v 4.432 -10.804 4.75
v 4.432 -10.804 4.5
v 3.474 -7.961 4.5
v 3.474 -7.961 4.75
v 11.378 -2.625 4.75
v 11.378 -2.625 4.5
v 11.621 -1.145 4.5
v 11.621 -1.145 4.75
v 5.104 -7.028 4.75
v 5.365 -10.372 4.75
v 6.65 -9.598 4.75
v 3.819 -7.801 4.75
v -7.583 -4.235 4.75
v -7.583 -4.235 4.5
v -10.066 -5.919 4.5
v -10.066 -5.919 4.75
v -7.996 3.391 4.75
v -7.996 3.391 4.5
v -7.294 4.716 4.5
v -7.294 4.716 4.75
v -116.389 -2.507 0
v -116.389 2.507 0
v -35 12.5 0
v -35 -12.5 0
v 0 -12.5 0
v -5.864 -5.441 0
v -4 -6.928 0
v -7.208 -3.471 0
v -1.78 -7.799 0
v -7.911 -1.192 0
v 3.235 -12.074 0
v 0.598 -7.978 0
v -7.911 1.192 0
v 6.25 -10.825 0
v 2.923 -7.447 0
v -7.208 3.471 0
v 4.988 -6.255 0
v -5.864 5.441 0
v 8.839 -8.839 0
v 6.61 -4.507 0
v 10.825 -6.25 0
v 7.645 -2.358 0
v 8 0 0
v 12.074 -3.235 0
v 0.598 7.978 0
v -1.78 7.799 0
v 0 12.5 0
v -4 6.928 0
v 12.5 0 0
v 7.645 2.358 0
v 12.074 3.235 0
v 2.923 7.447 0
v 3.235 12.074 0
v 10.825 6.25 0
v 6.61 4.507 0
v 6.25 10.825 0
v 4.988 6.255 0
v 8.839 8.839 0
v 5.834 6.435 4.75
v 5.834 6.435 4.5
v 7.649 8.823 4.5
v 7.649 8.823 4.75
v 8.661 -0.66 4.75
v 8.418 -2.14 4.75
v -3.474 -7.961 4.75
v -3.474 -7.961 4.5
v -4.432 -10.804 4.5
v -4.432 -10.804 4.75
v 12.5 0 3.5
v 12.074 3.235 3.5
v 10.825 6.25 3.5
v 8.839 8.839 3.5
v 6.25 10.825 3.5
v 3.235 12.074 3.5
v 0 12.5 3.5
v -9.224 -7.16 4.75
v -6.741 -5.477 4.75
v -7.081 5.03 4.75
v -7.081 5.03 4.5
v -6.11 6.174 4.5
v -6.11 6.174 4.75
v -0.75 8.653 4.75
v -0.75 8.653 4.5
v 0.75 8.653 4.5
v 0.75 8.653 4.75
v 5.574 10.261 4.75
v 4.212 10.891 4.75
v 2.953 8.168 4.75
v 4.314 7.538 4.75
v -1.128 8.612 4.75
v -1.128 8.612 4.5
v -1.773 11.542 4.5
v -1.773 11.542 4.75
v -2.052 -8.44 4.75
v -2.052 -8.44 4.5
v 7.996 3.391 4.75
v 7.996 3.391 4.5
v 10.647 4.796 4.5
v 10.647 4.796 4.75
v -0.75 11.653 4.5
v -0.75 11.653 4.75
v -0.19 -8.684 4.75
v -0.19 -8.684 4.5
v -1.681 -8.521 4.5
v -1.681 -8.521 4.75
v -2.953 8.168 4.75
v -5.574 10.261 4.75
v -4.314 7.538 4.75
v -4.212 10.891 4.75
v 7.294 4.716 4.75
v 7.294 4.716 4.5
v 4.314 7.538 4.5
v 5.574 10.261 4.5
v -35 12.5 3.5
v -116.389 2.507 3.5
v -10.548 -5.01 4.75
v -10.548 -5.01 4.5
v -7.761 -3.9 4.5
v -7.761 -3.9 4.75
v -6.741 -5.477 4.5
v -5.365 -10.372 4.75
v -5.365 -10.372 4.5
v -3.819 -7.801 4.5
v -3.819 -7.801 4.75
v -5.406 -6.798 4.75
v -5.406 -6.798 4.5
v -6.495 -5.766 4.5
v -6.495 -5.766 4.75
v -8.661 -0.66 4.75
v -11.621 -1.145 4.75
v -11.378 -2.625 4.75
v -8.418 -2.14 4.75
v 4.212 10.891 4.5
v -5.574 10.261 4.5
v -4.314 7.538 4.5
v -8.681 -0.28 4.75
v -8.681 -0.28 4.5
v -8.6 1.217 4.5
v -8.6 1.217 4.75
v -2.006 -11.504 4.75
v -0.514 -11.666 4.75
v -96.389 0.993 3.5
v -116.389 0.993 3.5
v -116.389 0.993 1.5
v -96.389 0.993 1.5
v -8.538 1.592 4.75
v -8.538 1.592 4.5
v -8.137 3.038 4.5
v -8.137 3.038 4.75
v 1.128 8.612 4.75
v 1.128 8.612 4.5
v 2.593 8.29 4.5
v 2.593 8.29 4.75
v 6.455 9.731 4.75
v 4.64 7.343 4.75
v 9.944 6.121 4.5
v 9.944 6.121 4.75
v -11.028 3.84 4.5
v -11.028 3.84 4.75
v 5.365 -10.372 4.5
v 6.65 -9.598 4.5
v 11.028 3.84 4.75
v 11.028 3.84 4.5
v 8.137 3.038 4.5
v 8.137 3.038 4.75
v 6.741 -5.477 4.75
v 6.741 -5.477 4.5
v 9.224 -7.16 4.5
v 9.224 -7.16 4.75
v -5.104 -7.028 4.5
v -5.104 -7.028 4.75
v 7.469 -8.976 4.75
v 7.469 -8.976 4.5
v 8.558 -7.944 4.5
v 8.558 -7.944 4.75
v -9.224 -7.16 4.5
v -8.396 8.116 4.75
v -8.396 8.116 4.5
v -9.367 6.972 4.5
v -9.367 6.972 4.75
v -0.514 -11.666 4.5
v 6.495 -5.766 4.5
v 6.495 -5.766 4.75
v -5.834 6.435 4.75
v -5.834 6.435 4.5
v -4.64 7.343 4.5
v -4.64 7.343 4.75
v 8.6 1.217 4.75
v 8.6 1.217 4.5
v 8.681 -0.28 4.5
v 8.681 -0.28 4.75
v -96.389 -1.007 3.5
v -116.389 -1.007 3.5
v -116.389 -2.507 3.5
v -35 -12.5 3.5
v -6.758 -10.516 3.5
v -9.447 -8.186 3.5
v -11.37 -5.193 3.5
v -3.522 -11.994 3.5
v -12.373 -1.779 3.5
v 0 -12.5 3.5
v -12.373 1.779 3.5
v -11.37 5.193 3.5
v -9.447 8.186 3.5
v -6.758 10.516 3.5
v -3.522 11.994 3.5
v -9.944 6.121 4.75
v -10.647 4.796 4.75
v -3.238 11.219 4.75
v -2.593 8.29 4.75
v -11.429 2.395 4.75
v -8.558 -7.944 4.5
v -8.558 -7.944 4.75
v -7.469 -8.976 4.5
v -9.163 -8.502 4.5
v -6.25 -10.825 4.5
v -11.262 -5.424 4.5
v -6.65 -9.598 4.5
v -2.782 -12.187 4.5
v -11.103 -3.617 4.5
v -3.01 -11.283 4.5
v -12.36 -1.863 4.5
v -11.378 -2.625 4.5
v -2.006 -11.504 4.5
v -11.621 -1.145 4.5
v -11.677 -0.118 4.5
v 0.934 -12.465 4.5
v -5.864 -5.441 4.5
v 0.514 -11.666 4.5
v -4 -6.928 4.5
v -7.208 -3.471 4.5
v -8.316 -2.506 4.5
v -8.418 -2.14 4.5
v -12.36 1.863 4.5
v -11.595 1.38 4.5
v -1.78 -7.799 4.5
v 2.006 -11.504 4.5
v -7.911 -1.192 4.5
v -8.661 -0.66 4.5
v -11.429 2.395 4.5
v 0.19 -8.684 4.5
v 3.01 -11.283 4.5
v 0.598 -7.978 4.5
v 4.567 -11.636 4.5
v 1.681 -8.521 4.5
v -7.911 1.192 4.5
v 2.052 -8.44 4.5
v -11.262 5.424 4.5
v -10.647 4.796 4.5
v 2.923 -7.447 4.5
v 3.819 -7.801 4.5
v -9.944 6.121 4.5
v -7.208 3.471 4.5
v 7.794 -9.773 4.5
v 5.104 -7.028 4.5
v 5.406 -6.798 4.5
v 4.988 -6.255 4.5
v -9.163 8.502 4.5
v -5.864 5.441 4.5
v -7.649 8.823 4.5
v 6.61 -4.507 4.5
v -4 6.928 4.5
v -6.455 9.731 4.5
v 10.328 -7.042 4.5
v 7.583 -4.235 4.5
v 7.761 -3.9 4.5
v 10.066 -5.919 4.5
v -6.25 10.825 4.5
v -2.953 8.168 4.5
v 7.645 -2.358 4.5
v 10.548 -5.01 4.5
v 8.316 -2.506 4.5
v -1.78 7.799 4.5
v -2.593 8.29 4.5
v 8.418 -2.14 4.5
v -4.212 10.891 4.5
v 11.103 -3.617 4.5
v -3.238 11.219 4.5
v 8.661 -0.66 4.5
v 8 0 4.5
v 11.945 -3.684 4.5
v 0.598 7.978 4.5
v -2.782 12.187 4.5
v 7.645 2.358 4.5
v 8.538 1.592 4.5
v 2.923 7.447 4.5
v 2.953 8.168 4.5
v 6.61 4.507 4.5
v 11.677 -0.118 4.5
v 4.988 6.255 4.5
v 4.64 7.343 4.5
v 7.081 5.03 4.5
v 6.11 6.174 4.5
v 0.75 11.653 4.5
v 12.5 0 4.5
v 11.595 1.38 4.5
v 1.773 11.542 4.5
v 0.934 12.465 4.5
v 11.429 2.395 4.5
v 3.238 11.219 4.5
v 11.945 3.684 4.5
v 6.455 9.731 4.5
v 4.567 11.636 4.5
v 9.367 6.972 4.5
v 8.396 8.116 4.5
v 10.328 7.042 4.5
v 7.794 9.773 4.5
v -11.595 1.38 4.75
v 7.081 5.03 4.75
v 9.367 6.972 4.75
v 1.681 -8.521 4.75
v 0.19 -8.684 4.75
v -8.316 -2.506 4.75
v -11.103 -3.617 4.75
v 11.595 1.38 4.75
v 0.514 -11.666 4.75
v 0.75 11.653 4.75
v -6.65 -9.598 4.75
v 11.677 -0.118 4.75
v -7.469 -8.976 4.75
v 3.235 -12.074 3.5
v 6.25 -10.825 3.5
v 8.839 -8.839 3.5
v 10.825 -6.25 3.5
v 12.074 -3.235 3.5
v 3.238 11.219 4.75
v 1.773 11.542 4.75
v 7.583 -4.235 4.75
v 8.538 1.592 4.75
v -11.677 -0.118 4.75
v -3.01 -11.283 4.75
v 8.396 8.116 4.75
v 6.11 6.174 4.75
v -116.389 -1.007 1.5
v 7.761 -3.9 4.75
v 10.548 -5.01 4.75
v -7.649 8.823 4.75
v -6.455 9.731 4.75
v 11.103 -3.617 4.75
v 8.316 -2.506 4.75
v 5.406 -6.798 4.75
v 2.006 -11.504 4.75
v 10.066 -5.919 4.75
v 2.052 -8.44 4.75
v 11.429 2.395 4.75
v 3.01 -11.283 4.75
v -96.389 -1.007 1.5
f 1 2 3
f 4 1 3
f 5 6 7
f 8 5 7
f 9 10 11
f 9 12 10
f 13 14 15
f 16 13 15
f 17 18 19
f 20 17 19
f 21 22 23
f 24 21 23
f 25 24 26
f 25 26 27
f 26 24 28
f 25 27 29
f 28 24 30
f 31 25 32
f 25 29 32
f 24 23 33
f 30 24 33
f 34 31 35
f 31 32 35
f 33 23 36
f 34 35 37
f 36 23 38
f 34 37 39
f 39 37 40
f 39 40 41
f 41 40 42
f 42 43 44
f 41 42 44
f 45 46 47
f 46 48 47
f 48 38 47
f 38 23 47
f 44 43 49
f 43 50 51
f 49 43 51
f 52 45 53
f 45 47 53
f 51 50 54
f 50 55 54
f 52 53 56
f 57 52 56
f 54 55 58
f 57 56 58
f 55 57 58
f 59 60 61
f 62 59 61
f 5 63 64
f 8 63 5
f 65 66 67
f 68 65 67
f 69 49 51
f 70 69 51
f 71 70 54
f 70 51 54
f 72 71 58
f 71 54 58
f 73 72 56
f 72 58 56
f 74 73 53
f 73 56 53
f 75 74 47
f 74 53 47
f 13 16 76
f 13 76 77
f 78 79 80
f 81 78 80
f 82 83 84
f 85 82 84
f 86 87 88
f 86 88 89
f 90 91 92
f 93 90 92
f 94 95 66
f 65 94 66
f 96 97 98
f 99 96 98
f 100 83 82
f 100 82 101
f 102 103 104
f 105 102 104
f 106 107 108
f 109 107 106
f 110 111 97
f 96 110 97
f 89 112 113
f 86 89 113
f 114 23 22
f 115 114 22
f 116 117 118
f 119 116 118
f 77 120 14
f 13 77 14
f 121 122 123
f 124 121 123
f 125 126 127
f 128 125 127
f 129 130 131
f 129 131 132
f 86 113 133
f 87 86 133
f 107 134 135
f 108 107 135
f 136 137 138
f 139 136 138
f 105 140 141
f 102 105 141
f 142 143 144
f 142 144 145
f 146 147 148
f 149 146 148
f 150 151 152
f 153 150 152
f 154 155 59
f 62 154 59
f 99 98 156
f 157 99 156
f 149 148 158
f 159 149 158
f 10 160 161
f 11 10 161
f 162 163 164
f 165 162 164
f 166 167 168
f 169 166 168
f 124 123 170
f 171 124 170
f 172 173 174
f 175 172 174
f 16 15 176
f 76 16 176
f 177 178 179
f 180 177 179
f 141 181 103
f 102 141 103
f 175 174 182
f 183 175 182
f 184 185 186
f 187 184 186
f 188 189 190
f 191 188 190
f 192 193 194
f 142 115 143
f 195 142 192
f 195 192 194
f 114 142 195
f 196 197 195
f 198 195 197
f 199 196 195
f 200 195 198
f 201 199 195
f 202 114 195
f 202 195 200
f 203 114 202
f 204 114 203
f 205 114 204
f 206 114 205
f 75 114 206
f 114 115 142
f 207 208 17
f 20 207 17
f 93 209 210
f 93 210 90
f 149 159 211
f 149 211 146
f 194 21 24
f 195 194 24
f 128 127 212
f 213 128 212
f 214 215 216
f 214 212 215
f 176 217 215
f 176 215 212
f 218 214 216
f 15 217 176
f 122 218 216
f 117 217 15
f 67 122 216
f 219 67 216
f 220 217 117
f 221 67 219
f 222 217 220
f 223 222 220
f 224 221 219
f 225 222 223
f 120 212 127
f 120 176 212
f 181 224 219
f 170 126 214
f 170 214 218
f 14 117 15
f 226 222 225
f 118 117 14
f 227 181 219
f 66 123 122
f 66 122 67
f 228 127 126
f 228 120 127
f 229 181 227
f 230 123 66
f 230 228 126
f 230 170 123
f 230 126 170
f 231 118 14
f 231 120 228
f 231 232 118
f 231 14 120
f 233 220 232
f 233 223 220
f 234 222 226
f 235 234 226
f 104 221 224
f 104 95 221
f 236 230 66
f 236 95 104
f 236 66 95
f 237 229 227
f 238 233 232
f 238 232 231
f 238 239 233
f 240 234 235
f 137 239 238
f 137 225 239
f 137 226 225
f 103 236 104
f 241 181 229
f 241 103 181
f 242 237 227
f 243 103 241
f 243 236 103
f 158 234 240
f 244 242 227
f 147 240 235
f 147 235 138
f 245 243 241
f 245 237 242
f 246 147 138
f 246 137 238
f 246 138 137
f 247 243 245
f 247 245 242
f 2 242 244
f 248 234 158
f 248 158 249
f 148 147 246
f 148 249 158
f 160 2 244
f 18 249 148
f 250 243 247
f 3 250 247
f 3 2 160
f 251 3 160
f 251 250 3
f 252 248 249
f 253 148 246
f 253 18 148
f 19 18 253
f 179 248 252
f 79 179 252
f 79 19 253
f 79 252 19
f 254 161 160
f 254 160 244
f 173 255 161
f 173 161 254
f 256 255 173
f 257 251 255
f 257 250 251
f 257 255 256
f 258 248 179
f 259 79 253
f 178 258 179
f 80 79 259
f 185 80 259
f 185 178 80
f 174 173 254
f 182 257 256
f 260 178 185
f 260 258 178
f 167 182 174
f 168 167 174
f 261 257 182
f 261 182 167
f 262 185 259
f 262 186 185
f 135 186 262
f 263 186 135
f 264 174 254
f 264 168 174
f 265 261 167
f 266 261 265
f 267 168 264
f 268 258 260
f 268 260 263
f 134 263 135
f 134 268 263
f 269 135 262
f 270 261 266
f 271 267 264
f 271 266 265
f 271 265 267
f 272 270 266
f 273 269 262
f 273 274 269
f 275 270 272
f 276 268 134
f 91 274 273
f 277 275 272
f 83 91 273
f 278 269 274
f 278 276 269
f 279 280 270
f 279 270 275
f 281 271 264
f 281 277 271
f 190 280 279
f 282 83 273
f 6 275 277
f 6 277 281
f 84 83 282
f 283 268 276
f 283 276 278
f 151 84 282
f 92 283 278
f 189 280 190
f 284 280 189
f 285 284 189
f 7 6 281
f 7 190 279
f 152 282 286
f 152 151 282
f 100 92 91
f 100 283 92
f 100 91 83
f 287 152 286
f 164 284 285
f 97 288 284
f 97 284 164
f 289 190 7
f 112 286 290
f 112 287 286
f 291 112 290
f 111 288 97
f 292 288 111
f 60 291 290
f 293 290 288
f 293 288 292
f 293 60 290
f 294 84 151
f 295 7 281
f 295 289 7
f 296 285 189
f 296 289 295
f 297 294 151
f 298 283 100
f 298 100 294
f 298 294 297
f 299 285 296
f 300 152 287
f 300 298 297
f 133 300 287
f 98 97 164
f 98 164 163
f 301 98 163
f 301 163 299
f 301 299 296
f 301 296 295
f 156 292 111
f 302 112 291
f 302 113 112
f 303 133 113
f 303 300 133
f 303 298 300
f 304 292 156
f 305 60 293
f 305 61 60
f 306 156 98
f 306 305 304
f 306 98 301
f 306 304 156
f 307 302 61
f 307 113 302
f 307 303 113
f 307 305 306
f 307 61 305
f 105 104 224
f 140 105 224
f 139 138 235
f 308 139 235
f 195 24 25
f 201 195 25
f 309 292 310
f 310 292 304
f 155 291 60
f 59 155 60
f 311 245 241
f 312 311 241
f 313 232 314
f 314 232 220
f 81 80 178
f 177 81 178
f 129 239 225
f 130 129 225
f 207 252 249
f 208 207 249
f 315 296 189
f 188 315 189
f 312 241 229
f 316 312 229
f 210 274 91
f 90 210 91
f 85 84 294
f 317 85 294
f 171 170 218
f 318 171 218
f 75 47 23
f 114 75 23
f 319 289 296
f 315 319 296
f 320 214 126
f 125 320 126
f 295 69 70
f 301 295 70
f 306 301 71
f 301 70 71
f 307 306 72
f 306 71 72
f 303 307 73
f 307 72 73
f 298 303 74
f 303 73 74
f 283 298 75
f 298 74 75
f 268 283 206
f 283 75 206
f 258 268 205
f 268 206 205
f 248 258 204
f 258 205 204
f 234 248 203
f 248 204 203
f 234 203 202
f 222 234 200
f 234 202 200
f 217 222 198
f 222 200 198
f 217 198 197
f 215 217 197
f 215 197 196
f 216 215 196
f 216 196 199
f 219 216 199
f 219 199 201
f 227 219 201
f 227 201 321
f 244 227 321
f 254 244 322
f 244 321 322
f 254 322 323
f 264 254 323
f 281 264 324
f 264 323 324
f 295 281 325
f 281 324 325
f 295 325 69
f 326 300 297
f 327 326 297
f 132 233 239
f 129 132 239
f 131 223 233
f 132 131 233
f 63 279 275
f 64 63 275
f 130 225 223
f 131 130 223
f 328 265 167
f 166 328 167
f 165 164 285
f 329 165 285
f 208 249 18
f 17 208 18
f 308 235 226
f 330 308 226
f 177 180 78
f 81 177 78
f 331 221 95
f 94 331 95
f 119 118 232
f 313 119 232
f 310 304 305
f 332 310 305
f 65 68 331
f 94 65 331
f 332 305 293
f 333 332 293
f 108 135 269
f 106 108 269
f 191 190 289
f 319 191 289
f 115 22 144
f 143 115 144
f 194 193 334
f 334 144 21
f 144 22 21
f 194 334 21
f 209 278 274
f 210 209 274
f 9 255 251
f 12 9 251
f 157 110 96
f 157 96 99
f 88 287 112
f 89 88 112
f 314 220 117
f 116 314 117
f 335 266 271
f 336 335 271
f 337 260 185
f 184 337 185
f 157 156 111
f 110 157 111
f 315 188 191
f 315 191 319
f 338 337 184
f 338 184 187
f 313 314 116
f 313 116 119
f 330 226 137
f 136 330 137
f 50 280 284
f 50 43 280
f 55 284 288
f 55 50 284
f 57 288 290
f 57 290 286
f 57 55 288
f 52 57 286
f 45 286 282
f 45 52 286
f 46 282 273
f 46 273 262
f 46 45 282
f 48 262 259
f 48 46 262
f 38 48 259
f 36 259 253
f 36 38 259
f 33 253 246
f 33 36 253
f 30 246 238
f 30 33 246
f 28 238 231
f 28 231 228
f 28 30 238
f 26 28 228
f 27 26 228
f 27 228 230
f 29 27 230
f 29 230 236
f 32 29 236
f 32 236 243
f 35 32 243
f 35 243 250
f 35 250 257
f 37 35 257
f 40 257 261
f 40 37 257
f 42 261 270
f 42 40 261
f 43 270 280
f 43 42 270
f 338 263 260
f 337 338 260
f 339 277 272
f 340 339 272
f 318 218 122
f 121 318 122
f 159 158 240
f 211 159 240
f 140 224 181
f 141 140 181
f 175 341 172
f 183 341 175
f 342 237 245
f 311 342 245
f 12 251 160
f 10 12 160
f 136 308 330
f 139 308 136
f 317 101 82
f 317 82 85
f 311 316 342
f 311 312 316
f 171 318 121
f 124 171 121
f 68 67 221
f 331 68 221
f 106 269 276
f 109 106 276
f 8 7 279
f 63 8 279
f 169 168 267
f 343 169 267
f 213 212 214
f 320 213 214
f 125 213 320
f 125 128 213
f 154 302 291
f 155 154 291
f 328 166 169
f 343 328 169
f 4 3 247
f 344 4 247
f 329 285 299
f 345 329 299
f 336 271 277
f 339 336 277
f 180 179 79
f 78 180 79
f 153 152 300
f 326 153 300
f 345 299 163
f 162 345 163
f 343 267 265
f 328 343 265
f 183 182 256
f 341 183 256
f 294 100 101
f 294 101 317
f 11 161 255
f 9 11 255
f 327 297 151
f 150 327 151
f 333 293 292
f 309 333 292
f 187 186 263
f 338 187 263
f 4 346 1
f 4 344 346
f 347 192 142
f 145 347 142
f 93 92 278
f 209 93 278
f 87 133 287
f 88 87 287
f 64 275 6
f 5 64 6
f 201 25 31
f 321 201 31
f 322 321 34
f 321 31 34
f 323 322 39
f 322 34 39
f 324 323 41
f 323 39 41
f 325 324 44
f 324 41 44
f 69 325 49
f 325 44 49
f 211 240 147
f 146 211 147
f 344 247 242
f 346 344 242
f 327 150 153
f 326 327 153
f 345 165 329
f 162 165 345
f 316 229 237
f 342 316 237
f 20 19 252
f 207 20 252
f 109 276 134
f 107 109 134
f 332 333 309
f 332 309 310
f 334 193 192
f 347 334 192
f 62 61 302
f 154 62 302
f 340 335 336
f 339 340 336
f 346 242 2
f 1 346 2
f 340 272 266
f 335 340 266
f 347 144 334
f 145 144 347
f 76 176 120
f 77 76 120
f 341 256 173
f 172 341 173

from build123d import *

# Parameters (mm, degrees)
F0_R     = 8
F1_DEPTH = 3.5
F2_R     = 12.5
F2_R_2   = 8
F3_DEPTH = 1
F4_W     = 20
F4_H     = 2
F5_DEPTH = 2
F6_W     = 1.5
F6_H     = 3
F7_DEPTH = 0.25


with BuildPart() as f1:
    # F0 (on Top) → F1 (new body)
    with BuildSketch(Plane.XY):
        with BuildLine():
            ThreePointArc((0, -12.5), (8.838835, -8.838835), (12.5, 0))
            ThreePointArc((12.5, 0), (8.838835, 8.838835), (0, 12.5))
            ThreePointArc((0, 12.5), (-12.5, 0), (0, -12.5))
        make_face()
        Circle(F0_R, mode=Mode.SUBTRACT)
        with BuildLine():
            ThreePointArc((0, -12.5), (-12.5, 0), (0, 12.5))
            Line((0, 12.5), (-35, 12.5))
            Line((-35, 12.5), (-116.388784, 2.506714))
            Line((-116.388784, 2.506714), (-116.388784, -2.506714))
            Line((-116.388784, -2.506714), (-35, -12.5))
            Line((-35, -12.5), (0, -12.5))
        make_face()
    extrude(amount=F1_DEPTH)

    # F2 (on face) → F3 (join)
    with BuildSketch(Plane.XY.offset(3.5)):
        Circle(F2_R)
        Circle(F2_R_2, mode=Mode.SUBTRACT)
    extrude(amount=F3_DEPTH)

    # F4 (on face) → F5 (cut)
    with BuildSketch(Plane.XY.offset(3.5)):
        with Locations((-106.388784, -0.006714)):
            Rectangle(F4_W, F4_H)
    extrude(amount=-F5_DEPTH, mode=Mode.SUBTRACT)

    # F6 (on face) → F7 (join)
    with BuildSketch(Plane.XY.offset(4.5)):
        with Locations((0, 10.153166)):
            Rectangle(F6_W, F6_H)
        Polygon((3.237552, 11.219494), (1.772621, 11.541949), (1.127709, 8.612088), (2.59264, 8.289632), align=None)
        Polygon((5.573719, 10.26121), (4.212356, 10.891044), (2.952689, 8.168318), (4.314052, 7.538484), align=None)
        Polygon((7.649265, 8.823124), (6.455126, 9.730885), (4.639603, 7.342606), (5.833743, 6.434845), align=None)
        Polygon((9.367141, 6.972478), (8.396061, 8.115721), (6.109575, 6.173563), (7.080655, 5.030319), align=None)
        Polygon((10.647019, 4.795807), (9.944406, 6.121075), (7.29387, 4.71585), (7.996483, 3.390582), align=None)
        Polygon((11.429054, 2.39489), (11.027762, 3.840215), (8.137112, 3.03763), (8.538404, 1.592305), align=None)
        Polygon((11.67668, -0.11801), (11.595471, 1.37979), (8.599871, 1.217373), (8.68108, -0.280427), align=None)
        Polygon((11.378317, -2.625392), (11.62099, -1.145153), (8.66051, -0.659807), (8.417837, -2.140046), align=None)
        Polygon((10.547916, -5.010014), (11.103124, -3.616549), (8.316193, -2.506134), (7.760986, -3.899599), align=None)
        Polygon((9.224307, -7.160373), (10.066088, -5.918839), (7.583021, -4.235278), (6.74124, -5.476812), align=None)
        Polygon((7.469379, -8.975921), (8.558373, -7.944371), (6.495274, -5.766385), (5.406281, -6.797934), align=None)
        Polygon((5.365192, -10.371764), (6.650478, -9.598434), (5.103816, -7.027862), (3.81853, -7.801193), align=None)
        Polygon((3.010134, -11.282636), (4.431614, -10.803684), (3.473709, -7.960724), (2.052229, -8.439676), align=None)
        Polygon((0.514325, -11.665944), (2.005532, -11.503765), (1.681175, -8.521352), (0.189968, -8.68353), align=None)
        Polygon((-2.005532, -11.503765), (-0.514325, -11.665944), (-0.189968, -8.68353), (-1.681175, -8.521352), align=None)
        Polygon((-4.431614, -10.803684), (-3.010134, -11.282636), (-2.052229, -8.439676), (-3.473709, -7.960724), align=None)
        Polygon((-6.650478, -9.598434), (-5.365192, -10.371764), (-3.81853, -7.801193), (-5.103816, -7.027862), align=None)
        Polygon((-8.558373, -7.944371), (-7.469379, -8.975921), (-5.406281, -6.797934), (-6.495274, -5.766385), align=None)
        Polygon((-10.066088, -5.918839), (-9.224307, -7.160373), (-6.74124, -5.476812), (-7.583021, -4.235278), align=None)
        Polygon((-11.103124, -3.616549), (-10.547916, -5.010014), (-7.760986, -3.899599), (-8.316193, -2.506134), align=None)
        Polygon((-11.62099, -1.145153), (-11.378317, -2.625392), (-8.417837, -2.140046), (-8.66051, -0.659807), align=None)
        Polygon((-11.595471, 1.37979), (-11.67668, -0.11801), (-8.68108, -0.280427), (-8.599871, 1.217373), align=None)
        Polygon((-11.027762, 3.840215), (-11.429054, 2.39489), (-8.538404, 1.592305), (-8.137112, 3.03763), align=None)
        Polygon((-9.944406, 6.121075), (-10.647019, 4.795807), (-7.996483, 3.390582), (-7.29387, 4.71585), align=None)
        Polygon((-8.396061, 8.115721), (-9.367141, 6.972478), (-7.080655, 5.030319), (-6.109575, 6.173563), align=None)
        Polygon((-6.455126, 9.730885), (-7.649265, 8.823124), (-5.833743, 6.434845), (-4.639603, 7.342606), align=None)
        Polygon((-4.212356, 10.891044), (-5.573719, 10.26121), (-4.314052, 7.538484), (-2.952689, 8.168318), align=None)
        Polygon((-1.772621, 11.541949), (-3.237552, 11.219494), (-2.59264, 8.289632), (-1.127709, 8.612088), align=None)
    extrude(amount=F7_DEPTH)


solid = f1.part
